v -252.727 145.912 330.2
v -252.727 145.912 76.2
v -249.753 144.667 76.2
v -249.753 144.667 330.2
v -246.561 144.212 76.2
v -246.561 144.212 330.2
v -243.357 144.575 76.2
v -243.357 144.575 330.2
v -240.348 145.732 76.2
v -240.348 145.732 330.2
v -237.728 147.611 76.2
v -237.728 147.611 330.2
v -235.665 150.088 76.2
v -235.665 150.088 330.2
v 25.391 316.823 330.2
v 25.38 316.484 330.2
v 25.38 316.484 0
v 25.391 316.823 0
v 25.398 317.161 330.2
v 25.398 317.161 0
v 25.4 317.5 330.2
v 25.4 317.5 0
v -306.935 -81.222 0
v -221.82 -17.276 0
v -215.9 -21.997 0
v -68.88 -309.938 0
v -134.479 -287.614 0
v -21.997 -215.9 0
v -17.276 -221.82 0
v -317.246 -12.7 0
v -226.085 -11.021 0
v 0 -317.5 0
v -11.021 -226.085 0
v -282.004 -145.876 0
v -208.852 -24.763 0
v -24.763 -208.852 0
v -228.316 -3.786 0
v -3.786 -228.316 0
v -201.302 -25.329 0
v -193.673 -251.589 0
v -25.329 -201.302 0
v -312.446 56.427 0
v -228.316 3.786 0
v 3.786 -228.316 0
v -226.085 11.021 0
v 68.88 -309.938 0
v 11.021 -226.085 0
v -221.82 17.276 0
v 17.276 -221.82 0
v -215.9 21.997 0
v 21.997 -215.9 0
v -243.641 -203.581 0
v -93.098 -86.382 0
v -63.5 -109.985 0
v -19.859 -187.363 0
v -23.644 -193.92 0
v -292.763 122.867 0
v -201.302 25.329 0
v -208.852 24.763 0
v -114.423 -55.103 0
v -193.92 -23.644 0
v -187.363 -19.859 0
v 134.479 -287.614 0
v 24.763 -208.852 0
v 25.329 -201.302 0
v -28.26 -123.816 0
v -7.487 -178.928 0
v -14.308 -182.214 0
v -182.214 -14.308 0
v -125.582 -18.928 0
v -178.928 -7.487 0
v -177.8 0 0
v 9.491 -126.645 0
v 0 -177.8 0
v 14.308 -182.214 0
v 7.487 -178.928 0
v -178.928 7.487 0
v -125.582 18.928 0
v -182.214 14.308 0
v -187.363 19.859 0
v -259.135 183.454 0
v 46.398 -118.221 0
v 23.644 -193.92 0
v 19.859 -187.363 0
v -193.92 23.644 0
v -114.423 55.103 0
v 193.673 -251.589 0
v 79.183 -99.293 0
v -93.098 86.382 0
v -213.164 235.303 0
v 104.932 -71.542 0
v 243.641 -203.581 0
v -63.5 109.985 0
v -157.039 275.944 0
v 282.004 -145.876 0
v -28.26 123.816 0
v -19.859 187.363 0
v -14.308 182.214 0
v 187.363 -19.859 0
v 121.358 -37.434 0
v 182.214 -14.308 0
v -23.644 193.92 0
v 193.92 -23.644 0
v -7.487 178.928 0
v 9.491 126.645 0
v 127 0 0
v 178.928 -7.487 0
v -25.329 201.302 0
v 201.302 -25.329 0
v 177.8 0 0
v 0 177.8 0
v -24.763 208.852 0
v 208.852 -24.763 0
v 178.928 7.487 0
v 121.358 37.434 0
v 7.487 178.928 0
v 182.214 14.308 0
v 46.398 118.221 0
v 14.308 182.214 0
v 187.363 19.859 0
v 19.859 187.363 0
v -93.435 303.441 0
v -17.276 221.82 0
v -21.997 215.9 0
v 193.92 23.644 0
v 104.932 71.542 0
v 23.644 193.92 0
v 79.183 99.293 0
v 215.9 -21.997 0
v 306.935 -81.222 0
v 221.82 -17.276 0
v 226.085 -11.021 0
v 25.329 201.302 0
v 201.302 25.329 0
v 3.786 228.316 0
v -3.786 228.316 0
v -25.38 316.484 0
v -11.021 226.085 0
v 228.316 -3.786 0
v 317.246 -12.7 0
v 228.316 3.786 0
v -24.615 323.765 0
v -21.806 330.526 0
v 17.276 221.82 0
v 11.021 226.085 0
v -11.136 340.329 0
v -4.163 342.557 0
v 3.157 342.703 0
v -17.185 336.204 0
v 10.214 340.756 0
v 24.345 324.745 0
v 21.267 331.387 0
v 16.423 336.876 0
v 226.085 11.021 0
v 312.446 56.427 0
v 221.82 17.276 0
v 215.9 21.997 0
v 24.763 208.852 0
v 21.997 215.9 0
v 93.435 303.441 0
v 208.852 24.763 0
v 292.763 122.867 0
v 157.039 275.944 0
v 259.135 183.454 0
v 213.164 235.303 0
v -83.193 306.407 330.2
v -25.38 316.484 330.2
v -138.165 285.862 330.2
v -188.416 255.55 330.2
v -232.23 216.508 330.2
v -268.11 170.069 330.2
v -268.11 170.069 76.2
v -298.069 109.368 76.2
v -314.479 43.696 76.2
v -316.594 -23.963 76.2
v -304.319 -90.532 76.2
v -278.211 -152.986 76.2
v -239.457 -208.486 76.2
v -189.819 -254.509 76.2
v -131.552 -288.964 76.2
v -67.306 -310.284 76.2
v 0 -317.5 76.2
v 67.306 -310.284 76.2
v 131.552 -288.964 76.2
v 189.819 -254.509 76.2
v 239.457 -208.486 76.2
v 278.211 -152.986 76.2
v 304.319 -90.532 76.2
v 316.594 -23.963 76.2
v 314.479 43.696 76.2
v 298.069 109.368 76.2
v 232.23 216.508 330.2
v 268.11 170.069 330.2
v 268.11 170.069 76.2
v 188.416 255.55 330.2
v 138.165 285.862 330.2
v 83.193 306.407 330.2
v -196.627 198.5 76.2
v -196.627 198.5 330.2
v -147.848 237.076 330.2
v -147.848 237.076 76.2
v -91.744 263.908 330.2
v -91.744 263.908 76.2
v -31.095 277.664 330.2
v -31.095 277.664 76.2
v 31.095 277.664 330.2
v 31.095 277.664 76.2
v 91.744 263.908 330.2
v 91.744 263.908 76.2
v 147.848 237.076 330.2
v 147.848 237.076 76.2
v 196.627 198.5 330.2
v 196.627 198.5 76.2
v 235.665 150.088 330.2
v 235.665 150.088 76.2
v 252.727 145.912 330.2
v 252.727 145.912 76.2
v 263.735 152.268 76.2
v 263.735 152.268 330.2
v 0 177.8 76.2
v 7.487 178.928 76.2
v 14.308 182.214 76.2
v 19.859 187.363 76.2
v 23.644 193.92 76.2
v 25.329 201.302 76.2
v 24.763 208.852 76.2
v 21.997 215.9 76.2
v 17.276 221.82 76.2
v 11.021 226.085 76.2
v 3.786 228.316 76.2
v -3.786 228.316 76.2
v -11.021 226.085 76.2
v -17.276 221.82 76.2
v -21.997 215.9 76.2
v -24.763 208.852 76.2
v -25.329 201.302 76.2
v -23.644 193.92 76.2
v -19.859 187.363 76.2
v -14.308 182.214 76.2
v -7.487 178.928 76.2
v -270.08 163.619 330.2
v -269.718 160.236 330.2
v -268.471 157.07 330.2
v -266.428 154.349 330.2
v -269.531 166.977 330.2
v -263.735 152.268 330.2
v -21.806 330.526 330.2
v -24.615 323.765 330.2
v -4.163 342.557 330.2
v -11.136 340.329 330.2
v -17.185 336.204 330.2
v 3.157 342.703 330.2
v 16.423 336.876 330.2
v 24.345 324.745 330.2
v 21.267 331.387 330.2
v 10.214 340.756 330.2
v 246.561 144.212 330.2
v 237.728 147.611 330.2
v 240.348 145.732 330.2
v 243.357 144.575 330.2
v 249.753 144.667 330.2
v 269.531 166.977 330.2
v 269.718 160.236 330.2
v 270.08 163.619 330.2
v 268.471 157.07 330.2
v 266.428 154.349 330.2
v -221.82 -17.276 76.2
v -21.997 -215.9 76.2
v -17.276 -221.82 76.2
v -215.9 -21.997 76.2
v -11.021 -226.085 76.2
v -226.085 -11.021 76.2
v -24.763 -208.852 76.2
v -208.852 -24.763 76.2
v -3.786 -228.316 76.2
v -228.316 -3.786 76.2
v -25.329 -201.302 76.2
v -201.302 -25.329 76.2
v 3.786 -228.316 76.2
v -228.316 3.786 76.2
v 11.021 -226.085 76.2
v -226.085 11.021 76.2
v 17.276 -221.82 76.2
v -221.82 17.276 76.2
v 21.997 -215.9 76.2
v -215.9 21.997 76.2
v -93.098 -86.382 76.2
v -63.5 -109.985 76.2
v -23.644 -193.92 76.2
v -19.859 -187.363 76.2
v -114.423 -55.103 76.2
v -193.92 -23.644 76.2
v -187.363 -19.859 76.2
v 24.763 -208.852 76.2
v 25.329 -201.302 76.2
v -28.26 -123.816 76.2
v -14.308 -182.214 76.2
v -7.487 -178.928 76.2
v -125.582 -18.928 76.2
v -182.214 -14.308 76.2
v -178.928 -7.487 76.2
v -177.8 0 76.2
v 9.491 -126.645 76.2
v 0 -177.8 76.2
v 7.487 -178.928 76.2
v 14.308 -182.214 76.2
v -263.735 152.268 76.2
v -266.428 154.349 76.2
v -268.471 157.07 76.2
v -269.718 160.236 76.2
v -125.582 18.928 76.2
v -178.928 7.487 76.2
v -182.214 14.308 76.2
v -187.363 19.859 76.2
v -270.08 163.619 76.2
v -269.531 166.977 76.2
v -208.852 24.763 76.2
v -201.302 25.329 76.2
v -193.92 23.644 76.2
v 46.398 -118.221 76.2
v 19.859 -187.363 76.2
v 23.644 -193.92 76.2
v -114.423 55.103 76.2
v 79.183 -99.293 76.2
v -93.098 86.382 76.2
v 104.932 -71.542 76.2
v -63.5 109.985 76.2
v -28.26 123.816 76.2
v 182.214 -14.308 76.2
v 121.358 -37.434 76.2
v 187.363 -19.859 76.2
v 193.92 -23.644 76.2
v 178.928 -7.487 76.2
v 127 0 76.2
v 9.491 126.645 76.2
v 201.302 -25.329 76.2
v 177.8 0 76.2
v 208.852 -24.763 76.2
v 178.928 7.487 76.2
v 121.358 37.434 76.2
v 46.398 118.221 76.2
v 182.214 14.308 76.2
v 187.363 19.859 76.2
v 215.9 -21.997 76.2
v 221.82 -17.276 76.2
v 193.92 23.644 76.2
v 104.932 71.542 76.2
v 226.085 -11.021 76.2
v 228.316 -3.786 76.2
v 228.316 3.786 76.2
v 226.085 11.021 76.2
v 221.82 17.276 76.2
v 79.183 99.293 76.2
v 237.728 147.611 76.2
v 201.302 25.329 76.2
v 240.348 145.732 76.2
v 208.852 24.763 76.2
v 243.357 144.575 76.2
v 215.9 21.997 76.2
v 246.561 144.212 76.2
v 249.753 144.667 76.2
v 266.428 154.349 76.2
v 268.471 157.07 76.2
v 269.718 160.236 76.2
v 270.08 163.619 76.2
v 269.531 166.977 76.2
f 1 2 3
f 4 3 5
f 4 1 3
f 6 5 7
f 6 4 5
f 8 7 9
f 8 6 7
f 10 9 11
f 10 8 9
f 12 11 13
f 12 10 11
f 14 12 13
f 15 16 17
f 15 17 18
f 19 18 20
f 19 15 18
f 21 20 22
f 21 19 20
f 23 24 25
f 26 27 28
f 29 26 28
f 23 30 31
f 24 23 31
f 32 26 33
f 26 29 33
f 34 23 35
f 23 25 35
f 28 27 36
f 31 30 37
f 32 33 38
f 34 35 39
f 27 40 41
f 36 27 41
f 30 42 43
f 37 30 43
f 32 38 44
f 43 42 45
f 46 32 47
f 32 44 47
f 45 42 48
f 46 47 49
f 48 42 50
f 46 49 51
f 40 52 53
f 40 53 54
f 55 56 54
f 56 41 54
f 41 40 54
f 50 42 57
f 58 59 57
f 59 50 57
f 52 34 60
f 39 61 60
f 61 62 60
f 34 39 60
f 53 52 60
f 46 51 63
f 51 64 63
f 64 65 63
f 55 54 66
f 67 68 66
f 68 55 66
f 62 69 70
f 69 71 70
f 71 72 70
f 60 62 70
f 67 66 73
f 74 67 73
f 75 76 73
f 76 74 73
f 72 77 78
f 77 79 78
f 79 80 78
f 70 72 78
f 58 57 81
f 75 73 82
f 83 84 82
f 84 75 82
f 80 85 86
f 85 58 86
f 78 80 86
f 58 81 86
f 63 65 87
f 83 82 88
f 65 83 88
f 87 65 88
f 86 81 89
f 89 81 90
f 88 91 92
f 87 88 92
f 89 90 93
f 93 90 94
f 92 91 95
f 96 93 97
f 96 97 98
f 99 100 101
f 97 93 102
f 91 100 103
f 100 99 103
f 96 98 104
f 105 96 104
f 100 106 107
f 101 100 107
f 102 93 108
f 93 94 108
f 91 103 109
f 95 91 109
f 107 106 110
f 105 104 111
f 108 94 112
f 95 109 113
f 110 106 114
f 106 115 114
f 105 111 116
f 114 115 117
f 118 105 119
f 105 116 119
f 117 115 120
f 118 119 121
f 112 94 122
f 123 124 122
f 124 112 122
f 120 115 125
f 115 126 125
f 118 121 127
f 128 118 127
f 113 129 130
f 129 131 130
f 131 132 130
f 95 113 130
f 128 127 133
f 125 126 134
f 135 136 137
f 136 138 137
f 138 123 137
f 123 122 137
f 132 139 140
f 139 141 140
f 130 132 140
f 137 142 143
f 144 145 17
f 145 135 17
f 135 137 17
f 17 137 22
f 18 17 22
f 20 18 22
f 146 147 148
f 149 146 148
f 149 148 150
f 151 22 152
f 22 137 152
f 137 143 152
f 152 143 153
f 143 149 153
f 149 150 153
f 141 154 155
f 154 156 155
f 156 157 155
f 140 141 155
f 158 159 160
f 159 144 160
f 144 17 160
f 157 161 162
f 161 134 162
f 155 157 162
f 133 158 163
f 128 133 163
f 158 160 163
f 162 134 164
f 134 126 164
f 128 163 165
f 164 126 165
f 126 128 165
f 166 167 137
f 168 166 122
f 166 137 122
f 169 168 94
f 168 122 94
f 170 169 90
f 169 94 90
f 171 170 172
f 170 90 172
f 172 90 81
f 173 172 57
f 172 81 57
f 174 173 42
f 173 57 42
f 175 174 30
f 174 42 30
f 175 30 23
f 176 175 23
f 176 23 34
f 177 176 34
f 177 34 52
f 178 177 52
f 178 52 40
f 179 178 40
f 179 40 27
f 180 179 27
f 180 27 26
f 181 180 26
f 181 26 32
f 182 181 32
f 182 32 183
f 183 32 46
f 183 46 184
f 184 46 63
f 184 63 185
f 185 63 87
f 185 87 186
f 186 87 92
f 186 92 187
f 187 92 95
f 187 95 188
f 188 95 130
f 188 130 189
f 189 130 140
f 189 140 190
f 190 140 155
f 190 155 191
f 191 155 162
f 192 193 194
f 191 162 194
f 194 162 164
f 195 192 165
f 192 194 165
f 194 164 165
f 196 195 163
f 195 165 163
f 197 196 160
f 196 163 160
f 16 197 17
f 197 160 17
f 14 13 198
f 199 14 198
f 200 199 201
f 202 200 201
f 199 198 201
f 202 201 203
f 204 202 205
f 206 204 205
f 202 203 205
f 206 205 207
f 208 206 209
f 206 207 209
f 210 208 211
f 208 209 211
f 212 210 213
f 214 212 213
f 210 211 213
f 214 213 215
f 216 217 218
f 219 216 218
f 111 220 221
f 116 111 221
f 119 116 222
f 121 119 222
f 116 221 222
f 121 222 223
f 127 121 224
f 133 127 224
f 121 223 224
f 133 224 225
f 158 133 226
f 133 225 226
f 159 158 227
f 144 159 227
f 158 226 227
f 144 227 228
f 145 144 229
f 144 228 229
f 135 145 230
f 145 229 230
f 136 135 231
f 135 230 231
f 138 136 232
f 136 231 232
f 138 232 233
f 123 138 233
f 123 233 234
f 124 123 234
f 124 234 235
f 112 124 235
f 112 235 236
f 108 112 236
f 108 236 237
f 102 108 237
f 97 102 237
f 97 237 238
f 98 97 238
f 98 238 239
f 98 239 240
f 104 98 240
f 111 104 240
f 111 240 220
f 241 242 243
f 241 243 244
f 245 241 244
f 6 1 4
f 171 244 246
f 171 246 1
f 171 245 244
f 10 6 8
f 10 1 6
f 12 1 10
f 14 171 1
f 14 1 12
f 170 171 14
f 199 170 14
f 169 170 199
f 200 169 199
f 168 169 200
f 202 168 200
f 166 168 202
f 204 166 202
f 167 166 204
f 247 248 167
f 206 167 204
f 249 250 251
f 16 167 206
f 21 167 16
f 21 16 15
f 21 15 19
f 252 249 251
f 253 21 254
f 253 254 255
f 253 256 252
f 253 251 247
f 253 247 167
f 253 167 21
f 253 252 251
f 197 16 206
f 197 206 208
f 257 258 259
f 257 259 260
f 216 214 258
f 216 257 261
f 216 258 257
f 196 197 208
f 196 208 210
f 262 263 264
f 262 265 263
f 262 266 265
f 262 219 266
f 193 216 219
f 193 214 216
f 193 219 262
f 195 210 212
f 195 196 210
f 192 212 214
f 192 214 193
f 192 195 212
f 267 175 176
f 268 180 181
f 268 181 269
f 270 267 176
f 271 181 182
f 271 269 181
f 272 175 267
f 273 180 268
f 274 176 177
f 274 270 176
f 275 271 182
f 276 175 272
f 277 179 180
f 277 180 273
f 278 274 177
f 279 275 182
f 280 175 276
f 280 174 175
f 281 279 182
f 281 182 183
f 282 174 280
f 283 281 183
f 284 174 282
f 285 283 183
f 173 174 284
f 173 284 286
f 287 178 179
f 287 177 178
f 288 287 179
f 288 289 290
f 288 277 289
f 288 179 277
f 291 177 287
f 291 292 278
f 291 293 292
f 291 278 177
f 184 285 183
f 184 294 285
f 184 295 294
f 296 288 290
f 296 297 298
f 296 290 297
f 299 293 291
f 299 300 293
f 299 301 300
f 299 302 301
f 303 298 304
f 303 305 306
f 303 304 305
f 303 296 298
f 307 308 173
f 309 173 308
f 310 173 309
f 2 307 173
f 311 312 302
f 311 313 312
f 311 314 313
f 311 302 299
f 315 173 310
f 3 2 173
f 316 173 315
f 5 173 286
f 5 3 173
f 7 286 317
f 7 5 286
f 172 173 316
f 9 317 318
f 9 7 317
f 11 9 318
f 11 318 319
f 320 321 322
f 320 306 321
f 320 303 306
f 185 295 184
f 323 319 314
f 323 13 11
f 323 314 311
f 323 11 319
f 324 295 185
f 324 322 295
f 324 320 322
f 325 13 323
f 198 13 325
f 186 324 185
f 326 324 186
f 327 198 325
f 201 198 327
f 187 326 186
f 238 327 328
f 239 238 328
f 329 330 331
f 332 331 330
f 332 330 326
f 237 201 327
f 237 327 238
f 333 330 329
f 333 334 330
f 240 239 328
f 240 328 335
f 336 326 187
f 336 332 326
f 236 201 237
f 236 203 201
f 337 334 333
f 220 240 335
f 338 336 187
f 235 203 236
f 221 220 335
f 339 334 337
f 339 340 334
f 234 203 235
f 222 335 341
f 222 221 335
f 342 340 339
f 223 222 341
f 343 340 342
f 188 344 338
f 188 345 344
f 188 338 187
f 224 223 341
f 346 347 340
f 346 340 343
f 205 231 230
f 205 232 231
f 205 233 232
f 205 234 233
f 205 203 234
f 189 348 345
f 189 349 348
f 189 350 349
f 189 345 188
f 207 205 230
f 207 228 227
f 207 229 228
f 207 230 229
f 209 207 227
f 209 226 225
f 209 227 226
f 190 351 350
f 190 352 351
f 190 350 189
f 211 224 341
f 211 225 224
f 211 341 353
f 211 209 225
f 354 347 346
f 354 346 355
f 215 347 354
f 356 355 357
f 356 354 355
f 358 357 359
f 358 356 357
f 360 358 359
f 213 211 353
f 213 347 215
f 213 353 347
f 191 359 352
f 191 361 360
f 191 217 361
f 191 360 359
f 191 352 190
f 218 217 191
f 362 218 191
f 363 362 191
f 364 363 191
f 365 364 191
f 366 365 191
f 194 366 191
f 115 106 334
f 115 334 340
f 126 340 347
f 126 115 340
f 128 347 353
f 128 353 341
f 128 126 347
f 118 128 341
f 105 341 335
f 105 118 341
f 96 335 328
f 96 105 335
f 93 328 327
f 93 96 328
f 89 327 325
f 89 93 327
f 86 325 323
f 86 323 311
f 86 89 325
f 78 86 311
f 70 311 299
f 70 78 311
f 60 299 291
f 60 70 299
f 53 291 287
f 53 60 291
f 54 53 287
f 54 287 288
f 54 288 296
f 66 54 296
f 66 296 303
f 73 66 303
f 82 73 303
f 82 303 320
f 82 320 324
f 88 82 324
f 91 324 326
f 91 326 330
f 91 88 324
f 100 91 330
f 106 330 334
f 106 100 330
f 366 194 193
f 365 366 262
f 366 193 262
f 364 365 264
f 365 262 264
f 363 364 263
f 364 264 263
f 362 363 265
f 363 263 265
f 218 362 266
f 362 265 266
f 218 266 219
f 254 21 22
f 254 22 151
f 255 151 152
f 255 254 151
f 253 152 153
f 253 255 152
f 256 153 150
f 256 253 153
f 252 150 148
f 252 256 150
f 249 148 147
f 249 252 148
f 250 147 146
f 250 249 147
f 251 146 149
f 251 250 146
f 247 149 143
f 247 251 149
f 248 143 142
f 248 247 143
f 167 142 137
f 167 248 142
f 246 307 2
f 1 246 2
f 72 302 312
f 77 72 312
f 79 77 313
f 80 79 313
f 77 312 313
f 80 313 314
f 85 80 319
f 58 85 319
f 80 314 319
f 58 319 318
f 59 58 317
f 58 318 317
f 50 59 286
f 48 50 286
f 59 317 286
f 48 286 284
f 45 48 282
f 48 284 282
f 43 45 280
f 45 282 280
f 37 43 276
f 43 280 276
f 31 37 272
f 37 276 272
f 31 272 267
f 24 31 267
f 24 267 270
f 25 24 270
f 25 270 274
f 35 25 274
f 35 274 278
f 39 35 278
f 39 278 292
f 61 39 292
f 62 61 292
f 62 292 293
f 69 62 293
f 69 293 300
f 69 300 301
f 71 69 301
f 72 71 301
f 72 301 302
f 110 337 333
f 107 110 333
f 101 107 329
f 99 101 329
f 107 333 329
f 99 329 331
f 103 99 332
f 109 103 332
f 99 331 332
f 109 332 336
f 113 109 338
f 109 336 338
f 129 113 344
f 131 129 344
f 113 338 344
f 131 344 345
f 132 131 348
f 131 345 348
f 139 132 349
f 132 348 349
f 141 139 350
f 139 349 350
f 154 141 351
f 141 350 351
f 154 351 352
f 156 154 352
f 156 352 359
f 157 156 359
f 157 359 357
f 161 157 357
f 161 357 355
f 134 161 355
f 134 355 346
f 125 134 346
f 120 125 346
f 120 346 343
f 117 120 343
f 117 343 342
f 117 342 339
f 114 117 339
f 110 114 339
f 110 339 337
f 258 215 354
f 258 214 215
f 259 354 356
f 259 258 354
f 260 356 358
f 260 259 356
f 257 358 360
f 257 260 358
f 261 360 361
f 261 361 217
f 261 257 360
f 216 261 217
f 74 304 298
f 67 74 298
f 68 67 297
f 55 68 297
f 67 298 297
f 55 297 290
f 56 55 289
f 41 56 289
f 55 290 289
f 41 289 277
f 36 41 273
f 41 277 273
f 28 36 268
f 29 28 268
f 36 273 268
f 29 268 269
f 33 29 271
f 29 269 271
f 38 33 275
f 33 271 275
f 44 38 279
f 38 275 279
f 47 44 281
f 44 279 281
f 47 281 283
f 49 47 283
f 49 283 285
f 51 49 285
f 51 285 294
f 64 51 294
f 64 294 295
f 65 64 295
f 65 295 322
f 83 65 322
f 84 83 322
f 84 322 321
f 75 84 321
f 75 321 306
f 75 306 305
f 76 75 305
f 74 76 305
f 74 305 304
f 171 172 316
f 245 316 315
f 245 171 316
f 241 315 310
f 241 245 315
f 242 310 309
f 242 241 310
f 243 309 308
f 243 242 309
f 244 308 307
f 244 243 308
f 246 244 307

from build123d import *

# Parameters (mm, degrees)
F0_R            = 317.5
F0_R_2          = 127
F1_DEPTH        = 76.2
F3_DEPTH        = 254
F4_R            = 12.7
F6_DEPTH        = 330.2
F7_R            = 25.4
F8_DEPTH        = 76.201
F8_COPIES_COUNT = 4


# Not quite as in the source:
# - a pattern or mirror of a feature is missing from the dataset's text; its kind, count and spacing are read off the source's solid


with BuildPart() as f1:
    # F0 (on Top) → F1 (new body)
    with BuildSketch(Plane.XY):
        Circle(F0_R)
        Circle(F0_R_2, mode=Mode.SUBTRACT)
    extrude(amount=F1_DEPTH)

    # F2 (on face) → F3 (join)
    with BuildSketch(Plane.XY.offset(76.2)):
        with BuildLine():
            ThreePointArc((-241.9674978174, 139.7), (0, 279.4), (241.9674978174, 139.7))
            Line((241.9674978174, 139.7), (274.9630657016, 158.75))
            ThreePointArc((274.9630657016, 158.75), (0, 317.5), (-274.9630657016, 158.75))
            Line((-274.9630657016, 158.75), (-241.9674978174, 139.7))
        make_face()
    extrude(amount=F3_DEPTH)

    # F4
    f4_edges = [f1.edges().sort_by_distance(p)[0] for p in [
        (-274.963066, 158.75, 203.2),
        (-241.967498, 139.7, 203.2),
        (241.967498, 139.7, 203.2),
        (274.963066, 158.75, 203.2),
    ]]
    fillet(f4_edges, radius=F4_R)

    # F5 (on face) → F6 (join, through all)
    with BuildSketch(Plane.XY.offset(330.2)):
        with BuildLine():
            ThreePointArc((25.3796718655, 316.484), (25.3949174579, 316.9918983288), (25.4, 317.5))
            ThreePointArc((25.4, 317.5), (-0.5081016712, 342.8949174579), (-25.3796718655, 316.484))
            ThreePointArc((-25.3796718655, 316.484), (0, 317.5), (25.3796718655, 316.484))
        make_face()
        with BuildLine():
            ThreePointArc((25.3796718655, 316.484), (0, 317.5), (-25.3796718655, 316.484))
            ThreePointArc((-25.3796718655, 316.484), (0, 292.1), (25.3796718655, 316.484))
        make_face()
    extrude(amount=-F6_DEPTH)

    # F7 (on face) → F8 (cut, through all)
    with BuildSketch(Plane.XY.offset(76.2)):
        with Locations((-203.2, 0)):
            Circle(F7_R)
    f8 = extrude(amount=-F8_DEPTH, mode=Mode.SUBTRACT)

    # F8_copies: F8 ×4 about axis
    f8_copies_axis = Axis((0, 0, 0), (0, 0, 1))
    for i in range(1, F8_COPIES_COUNT):
        add(f8.rotate(f8_copies_axis, i * 360 / F8_COPIES_COUNT), mode=Mode.SUBTRACT)


solid = f1.part
